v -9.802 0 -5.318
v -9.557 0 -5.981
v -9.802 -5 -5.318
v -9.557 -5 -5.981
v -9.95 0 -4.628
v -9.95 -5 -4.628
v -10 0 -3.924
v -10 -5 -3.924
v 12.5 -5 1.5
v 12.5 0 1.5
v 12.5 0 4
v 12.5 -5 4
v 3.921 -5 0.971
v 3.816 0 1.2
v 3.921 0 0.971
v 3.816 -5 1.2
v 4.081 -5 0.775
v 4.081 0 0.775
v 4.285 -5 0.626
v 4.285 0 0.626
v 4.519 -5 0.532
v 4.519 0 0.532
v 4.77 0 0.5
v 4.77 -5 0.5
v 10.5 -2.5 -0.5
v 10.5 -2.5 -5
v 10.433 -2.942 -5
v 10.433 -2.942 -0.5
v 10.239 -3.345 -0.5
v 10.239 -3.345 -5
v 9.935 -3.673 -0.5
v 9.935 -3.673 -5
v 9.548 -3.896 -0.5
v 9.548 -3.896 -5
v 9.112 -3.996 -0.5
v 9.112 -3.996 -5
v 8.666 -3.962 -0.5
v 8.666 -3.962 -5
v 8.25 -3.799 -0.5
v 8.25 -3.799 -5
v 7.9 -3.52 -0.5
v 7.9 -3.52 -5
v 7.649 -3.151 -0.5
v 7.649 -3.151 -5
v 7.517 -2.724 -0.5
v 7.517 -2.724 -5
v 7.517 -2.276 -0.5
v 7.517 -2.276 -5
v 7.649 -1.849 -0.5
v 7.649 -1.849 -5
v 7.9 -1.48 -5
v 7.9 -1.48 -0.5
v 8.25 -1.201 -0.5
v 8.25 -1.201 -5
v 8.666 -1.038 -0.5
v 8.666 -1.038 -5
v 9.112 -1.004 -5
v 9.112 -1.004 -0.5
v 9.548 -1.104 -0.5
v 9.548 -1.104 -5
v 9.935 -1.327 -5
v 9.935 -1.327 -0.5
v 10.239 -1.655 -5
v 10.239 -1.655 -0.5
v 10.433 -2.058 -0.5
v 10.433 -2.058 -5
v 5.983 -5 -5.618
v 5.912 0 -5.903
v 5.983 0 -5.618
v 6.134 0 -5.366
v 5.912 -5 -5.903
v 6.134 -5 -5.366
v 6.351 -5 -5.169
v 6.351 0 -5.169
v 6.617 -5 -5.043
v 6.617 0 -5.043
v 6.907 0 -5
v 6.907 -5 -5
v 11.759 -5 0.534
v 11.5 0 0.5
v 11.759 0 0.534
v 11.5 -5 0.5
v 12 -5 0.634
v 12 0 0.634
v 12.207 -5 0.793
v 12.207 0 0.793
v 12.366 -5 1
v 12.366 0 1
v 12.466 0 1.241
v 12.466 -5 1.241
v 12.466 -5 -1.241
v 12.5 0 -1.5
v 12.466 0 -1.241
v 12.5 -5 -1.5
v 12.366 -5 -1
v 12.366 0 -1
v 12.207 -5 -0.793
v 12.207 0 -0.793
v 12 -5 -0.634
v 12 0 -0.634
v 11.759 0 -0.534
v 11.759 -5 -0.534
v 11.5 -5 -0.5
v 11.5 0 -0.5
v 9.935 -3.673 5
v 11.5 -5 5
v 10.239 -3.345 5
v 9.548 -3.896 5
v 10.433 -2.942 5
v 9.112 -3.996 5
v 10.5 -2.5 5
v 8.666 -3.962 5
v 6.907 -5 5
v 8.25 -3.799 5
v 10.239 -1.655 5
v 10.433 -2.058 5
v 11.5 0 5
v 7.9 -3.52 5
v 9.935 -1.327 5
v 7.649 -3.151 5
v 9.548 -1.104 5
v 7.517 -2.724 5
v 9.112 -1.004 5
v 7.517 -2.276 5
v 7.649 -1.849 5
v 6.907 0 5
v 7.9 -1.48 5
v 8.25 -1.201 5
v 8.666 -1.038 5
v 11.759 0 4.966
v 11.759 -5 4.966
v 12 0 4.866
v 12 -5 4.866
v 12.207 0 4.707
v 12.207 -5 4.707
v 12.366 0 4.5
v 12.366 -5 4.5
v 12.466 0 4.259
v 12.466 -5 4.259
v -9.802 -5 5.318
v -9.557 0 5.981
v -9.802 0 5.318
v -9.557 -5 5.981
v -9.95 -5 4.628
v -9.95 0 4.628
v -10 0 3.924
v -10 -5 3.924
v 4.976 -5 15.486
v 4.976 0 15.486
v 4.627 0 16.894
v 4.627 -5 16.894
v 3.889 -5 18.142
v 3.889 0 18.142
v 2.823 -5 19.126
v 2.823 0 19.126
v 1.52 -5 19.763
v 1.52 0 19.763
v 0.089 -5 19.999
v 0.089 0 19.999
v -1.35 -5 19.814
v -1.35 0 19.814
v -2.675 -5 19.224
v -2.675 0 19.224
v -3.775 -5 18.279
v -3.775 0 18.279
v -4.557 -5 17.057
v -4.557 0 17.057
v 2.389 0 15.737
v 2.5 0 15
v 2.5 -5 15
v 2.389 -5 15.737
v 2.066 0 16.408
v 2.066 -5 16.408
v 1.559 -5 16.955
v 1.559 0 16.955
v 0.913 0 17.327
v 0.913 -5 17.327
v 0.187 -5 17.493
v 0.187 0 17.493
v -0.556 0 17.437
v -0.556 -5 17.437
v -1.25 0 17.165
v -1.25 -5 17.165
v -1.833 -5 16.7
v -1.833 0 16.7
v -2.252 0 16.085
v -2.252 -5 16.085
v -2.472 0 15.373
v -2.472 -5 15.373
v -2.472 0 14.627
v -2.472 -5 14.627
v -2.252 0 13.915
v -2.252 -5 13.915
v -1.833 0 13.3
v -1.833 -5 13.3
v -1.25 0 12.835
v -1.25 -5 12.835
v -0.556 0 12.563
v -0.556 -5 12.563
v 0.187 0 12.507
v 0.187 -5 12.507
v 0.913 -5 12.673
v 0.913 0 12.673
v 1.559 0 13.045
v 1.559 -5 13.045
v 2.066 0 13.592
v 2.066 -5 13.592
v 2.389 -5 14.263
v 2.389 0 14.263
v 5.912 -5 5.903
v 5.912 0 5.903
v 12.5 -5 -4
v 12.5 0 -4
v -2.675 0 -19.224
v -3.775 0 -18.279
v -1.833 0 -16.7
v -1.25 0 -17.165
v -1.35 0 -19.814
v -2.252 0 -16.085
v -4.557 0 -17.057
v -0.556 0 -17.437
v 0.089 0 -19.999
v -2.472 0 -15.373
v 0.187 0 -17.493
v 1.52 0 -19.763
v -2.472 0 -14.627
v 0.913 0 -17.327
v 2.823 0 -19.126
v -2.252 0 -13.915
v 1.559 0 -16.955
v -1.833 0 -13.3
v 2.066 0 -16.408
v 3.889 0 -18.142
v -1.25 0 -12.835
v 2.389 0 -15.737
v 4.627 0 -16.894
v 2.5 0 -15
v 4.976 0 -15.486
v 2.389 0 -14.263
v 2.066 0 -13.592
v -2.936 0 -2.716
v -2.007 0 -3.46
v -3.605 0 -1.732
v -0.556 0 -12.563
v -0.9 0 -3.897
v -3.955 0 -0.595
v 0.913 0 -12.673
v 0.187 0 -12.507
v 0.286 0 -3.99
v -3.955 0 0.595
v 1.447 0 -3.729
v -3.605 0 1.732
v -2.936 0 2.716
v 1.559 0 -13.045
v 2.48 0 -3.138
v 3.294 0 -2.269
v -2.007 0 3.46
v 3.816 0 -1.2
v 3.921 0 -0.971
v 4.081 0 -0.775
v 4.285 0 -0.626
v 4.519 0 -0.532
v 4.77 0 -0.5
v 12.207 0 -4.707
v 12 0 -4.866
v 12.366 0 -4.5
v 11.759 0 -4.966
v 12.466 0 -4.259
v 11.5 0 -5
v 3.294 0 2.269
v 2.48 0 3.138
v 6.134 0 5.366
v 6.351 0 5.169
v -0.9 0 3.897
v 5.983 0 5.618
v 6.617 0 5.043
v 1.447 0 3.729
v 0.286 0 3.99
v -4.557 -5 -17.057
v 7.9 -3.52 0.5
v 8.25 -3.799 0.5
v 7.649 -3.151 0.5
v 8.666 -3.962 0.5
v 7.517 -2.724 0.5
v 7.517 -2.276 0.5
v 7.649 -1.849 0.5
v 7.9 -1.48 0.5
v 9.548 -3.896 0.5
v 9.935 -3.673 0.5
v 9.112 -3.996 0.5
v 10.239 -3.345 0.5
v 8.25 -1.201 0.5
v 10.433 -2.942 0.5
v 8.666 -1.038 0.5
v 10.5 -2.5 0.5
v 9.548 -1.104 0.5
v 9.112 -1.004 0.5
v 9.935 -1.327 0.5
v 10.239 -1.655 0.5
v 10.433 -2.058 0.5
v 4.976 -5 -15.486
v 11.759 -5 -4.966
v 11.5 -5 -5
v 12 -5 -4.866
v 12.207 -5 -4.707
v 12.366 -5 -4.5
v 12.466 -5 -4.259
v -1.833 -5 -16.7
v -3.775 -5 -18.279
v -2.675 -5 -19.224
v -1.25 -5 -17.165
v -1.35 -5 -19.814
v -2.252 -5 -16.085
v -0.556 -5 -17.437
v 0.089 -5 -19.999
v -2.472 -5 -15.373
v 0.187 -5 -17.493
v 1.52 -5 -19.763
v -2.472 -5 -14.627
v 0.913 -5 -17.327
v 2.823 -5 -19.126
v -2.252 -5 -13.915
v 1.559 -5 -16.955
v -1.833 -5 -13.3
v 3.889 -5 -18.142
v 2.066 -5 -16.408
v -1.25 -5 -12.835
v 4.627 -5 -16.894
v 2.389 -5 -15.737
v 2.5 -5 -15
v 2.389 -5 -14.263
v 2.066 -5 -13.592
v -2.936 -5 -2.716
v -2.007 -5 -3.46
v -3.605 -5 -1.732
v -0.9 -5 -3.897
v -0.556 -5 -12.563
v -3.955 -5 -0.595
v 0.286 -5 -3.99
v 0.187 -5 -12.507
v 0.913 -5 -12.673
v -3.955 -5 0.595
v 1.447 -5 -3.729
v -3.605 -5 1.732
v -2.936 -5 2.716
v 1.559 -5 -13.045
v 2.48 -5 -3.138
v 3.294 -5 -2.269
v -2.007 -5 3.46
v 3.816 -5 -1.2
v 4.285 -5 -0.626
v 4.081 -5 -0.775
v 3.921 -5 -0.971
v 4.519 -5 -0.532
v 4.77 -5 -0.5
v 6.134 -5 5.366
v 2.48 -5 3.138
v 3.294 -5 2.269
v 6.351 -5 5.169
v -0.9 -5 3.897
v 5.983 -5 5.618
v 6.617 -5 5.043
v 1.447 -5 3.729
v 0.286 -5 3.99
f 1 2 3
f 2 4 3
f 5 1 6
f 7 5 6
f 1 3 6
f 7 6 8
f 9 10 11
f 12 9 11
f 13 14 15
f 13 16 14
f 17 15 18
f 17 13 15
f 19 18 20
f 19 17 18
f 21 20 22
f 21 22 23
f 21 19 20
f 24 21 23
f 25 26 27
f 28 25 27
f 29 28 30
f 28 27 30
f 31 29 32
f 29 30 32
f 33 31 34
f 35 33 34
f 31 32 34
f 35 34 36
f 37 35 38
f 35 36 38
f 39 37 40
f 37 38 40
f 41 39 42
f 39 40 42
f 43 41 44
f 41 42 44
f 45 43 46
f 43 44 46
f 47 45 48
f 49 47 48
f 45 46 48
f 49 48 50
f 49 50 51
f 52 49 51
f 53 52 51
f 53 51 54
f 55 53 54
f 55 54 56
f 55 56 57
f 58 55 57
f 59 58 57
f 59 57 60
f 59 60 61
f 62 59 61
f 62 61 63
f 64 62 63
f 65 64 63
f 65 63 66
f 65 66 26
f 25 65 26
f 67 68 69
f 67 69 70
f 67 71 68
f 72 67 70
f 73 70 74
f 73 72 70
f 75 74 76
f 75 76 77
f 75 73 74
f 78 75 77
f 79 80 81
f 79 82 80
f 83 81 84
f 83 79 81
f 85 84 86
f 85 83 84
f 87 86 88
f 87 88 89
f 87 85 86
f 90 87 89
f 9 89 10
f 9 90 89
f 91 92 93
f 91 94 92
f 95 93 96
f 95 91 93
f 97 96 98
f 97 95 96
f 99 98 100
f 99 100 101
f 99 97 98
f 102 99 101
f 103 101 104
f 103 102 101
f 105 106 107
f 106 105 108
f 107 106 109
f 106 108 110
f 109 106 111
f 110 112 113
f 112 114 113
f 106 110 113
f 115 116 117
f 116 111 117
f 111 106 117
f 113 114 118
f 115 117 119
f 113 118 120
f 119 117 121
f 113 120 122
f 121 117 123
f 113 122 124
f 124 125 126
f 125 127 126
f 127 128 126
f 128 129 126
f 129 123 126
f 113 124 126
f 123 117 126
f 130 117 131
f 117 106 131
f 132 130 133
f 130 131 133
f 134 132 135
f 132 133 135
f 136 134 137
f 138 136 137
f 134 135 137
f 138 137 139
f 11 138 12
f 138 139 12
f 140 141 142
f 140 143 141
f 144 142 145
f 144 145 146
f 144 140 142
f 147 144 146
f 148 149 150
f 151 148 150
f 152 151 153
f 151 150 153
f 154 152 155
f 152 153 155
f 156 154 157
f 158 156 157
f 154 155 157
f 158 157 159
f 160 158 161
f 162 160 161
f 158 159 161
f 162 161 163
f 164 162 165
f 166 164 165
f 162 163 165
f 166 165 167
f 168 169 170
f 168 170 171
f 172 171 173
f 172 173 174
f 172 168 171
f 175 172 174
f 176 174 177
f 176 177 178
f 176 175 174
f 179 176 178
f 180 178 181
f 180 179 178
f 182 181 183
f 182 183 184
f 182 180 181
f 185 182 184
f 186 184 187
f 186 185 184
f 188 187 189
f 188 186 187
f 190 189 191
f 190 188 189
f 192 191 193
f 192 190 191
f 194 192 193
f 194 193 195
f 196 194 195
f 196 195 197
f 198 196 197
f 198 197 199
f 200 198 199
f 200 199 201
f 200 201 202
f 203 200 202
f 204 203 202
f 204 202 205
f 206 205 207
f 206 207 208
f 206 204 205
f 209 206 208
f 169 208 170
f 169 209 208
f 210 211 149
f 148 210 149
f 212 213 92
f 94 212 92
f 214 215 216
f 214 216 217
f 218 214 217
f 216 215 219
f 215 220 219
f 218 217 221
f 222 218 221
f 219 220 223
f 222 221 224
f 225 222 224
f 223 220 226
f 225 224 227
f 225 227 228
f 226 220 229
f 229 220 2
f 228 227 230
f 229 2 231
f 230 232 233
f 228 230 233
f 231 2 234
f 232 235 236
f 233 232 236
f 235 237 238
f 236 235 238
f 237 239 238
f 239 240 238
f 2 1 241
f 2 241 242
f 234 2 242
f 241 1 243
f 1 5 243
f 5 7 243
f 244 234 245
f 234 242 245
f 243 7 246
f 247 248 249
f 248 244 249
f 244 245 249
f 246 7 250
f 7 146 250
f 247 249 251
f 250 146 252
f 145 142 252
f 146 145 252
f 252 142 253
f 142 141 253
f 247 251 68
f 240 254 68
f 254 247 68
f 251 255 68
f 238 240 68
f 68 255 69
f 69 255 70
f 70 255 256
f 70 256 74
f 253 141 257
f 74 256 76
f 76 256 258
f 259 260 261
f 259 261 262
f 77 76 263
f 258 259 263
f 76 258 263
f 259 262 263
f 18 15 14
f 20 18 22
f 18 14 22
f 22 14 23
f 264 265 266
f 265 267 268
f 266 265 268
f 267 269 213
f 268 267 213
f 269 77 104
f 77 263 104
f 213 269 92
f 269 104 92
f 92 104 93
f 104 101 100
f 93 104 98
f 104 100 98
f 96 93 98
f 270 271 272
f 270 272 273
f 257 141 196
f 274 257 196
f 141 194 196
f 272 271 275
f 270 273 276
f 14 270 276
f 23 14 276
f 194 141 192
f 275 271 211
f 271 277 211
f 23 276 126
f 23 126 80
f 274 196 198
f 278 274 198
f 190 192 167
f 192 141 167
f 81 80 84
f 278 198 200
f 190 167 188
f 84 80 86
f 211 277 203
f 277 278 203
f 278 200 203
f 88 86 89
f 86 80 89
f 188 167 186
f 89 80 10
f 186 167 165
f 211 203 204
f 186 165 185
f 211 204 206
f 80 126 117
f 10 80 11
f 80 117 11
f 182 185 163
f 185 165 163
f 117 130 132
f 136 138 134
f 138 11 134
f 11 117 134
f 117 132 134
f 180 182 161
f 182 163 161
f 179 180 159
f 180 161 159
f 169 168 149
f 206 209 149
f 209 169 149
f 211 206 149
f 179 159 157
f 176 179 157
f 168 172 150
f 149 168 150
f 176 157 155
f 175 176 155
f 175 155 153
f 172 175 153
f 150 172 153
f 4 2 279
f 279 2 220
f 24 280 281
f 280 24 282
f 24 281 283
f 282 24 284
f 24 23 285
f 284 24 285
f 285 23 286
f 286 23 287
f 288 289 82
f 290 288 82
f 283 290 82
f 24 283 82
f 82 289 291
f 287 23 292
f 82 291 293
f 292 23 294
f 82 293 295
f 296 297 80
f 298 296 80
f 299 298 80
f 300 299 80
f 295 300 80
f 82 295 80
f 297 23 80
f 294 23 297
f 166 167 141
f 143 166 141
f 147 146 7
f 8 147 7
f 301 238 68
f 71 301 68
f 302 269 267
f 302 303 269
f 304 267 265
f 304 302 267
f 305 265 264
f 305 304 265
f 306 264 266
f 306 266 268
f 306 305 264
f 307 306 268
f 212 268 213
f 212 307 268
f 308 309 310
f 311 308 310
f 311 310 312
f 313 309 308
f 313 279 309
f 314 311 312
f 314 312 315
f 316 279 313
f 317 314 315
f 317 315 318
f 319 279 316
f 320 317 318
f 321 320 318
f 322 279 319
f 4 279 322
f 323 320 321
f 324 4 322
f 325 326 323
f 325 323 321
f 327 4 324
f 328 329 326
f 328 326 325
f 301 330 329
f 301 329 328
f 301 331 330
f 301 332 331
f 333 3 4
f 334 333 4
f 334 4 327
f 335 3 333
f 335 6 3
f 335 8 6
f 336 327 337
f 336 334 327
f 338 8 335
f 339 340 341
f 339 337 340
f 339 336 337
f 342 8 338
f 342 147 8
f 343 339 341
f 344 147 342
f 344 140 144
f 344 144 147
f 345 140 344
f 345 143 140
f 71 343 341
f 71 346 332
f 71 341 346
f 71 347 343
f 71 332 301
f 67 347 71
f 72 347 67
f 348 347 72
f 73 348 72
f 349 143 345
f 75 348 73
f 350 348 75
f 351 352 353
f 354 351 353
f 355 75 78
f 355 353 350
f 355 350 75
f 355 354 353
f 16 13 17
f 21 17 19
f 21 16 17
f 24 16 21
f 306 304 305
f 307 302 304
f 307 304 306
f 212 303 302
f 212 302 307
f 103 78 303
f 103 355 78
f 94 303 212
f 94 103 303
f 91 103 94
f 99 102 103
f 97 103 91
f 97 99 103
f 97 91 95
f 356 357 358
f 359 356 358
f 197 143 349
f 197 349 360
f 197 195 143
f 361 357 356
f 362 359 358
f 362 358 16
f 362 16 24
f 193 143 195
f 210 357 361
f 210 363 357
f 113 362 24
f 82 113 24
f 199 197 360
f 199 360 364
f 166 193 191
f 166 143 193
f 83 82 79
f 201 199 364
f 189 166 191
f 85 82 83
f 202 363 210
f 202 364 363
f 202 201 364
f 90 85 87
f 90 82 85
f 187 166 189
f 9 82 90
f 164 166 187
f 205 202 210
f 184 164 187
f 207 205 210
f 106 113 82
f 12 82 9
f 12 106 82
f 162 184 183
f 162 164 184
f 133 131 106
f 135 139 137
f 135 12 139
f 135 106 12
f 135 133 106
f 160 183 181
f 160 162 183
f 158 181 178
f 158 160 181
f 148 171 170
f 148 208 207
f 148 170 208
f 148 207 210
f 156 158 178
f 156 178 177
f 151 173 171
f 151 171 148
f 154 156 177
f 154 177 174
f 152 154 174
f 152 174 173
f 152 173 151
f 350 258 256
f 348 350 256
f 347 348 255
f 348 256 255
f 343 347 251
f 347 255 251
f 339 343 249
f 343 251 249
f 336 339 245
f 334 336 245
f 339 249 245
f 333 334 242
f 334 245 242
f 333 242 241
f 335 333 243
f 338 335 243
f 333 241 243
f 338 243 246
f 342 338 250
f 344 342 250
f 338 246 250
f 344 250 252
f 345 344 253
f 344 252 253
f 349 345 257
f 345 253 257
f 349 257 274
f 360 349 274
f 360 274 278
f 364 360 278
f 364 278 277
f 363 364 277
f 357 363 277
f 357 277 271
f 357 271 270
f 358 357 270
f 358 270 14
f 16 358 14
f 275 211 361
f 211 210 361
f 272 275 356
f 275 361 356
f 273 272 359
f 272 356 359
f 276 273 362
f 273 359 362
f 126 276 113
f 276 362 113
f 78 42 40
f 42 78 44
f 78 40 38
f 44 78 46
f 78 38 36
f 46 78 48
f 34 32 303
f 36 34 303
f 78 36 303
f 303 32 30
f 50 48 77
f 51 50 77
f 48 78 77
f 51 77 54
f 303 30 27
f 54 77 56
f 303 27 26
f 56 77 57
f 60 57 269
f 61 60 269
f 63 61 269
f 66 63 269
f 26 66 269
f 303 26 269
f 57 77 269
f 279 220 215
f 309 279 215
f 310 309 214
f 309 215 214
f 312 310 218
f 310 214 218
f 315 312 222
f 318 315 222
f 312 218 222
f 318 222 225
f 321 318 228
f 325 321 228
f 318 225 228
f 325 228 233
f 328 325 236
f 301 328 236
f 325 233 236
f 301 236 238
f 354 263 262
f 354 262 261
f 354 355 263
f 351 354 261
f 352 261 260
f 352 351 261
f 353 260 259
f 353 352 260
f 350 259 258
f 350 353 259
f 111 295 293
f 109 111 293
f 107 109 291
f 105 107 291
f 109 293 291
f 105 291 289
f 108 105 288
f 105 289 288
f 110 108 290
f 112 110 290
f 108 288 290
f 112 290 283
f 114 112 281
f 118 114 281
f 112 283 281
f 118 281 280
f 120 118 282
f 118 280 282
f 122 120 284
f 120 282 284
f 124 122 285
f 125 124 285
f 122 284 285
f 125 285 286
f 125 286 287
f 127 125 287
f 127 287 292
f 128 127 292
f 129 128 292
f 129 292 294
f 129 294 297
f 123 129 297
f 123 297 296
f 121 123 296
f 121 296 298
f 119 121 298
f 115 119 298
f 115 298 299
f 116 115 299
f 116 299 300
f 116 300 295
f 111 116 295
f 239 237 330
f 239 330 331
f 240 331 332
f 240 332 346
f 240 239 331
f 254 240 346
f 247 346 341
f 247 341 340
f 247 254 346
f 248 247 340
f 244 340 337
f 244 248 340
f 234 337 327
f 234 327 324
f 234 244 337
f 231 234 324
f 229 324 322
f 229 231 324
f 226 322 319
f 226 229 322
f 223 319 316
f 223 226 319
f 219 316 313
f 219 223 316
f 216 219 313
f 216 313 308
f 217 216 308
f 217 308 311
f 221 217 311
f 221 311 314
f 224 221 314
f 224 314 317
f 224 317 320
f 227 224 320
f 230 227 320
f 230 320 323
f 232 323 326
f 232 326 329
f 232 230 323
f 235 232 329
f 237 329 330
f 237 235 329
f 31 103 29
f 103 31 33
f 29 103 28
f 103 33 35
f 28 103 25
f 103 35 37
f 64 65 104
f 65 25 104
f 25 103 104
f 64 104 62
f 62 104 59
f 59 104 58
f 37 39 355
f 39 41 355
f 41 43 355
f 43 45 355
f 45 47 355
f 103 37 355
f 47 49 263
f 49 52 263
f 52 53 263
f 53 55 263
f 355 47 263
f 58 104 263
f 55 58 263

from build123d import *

# Parameters (mm, degrees)
F0_R     = 2.5
F1_DEPTH = 5
F2_R     = 5
F3_R     = 1.5
F4_DEPTH = 25
F5_R     = 1


with BuildPart() as f1:
    # F0 (on Front) → F1 (new body)
    with BuildSketch(Plane.XZ):
        with BuildLine():
            ThreePointArc((3.968627, -0.5), (-4, 0), (3.968627, 0.5))
            Line((3.968627, 0.5), (12.5, 0.5))
            Line((12.5, 0.5), (12.5, 5))
            Line((12.5, 5), (6, 5))
            Line((6, 5), (4.976343, 15.485806))
            ThreePointArc((4.976343, 15.485806), (0.813163, 19.933434), (-4.557189, 17.057189))
            Line((-4.557189, 17.057189), (-10, 5))
            Line((-10, 5), (-10, -5))
            Line((-10, -5), (-4.557189, -17.057189))
            ThreePointArc((-4.557189, -17.057189), (0.813163, -19.933434), (4.976343, -15.485806))
            Line((4.976343, -15.485806), (6, -5))
            Line((6, -5), (12.5, -5))
            Line((12.5, -5), (12.5, -0.5))
            Line((12.5, -0.5), (3.968627, -0.5))
        make_face()
        with Locations((0, -15)):
            Circle(F0_R, mode=Mode.SUBTRACT)
        with Locations((0, 15)):
            Circle(F0_R, mode=Mode.SUBTRACT)
    extrude(amount=F1_DEPTH)

    # F2
    f2_edges = [f1.edges().sort_by_distance(p)[0] for p in [
        (-10, -2.5, -5),
        (-10, -2.5, 5),
    ]]
    fillet(f2_edges, radius=F2_R)

    # F3 (on face) → F4 (cut)
    with BuildSketch(Plane(origin=(0, 0, -5), x_dir=(1, 0, 0), z_dir=(0, 0, -1))):
        with Locations((9, 2.5)):
            Circle(F3_R)
    extrude(amount=-F4_DEPTH, mode=Mode.SUBTRACT)

    # F5
    f5_edges = [f1.edges().sort_by_distance(p)[0] for p in [
        (6, -2.5, -5),
        (12.5, -2.5, -5),
        (12.5, -2.5, 5),
        (6, -2.5, 5),
        (12.5, -2.5, 0.5),
        (12.5, -2.5, -0.5),
        (3.968627, -2.5, -0.5),
        (3.968627, -2.5, 0.5),
    ]]
    fillet(f5_edges, radius=F5_R)


solid = f1.part
